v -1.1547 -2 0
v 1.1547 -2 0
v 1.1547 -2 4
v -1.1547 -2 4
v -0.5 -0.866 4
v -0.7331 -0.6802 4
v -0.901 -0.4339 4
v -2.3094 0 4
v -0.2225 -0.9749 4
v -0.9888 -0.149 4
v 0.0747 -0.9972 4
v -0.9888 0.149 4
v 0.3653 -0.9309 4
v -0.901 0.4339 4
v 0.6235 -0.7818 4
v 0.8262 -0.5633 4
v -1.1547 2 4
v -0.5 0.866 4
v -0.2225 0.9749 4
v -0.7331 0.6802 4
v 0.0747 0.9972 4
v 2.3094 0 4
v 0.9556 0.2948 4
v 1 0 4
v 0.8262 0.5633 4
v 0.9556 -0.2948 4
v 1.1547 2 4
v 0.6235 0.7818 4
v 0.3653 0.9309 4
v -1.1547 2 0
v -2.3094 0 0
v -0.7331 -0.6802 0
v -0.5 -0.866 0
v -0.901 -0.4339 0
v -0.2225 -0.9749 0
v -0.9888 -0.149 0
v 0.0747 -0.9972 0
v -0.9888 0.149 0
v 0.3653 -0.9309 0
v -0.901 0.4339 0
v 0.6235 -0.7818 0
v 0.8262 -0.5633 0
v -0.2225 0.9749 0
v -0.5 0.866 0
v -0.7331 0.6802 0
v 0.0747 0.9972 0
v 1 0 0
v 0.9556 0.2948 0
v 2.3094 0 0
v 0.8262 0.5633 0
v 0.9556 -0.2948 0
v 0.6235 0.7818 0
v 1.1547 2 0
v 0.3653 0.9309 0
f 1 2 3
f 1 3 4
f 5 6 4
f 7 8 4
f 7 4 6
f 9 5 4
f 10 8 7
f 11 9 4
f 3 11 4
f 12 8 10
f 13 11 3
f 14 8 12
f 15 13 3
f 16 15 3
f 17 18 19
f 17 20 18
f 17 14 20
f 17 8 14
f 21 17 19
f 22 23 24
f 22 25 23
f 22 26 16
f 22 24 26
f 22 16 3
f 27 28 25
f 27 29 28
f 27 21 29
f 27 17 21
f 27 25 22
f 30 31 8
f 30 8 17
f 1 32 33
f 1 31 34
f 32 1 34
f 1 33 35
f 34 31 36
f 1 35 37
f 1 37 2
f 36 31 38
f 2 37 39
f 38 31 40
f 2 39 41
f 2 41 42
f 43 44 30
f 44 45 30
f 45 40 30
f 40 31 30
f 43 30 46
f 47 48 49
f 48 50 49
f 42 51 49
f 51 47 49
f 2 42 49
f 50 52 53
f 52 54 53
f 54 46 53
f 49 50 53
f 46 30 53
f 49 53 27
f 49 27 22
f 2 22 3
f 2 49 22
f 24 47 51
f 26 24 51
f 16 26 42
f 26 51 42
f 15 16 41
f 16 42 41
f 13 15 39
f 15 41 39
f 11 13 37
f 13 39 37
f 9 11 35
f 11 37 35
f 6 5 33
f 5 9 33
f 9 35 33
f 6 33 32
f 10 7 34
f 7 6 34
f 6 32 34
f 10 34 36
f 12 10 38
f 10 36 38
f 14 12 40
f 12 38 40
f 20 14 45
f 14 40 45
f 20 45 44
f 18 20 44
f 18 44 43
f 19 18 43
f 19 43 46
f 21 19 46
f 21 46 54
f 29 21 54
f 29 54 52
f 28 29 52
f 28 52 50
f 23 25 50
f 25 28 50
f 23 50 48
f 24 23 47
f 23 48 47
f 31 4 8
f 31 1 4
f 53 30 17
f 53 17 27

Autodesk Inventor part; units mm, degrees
ref_plane "YZ Plane" through (0, 0, 0) normal (1, 0, 0) x (0, 1, 0)
ref_plane "XZ Plane" through (0, 0, 0) normal (0, 1, 0) x (-1, 0, 0)
ref_plane "XY Plane" through (0, 0, 0) normal (0, 0, 1) x (1, 0, 0)
sketch "スケッチ1" plane through (0, 0, 0) normal (0, 0, 1) x (1, 0, 0)
  line L0 (1.1547, 2) -> (2.3094, 0)
  line L1 (2.3094, 0) -> (1.1547, -2)
  line L2 (1.1547, -2) -> (-1.1547, -2)
  line L3 (-1.1547, -2) -> (-2.3094, 0)
  line L4 (-2.3094, 0) -> (-1.1547, 2)
  line L5 (-1.1547, 2) -> (1.1547, 2)
  circle A0 centre (0, 0) radius 1
  line L6 (0, 0) -> (0, 0.4012)
  line L7 (0, 0) -> (0.3399, 0)
  dimension "d0" = 2
  dimension "d1" = 4
extrude "押し出し1" add sketch "スケッチ1" along normal blind 4
properties part number "spacer_m2"
